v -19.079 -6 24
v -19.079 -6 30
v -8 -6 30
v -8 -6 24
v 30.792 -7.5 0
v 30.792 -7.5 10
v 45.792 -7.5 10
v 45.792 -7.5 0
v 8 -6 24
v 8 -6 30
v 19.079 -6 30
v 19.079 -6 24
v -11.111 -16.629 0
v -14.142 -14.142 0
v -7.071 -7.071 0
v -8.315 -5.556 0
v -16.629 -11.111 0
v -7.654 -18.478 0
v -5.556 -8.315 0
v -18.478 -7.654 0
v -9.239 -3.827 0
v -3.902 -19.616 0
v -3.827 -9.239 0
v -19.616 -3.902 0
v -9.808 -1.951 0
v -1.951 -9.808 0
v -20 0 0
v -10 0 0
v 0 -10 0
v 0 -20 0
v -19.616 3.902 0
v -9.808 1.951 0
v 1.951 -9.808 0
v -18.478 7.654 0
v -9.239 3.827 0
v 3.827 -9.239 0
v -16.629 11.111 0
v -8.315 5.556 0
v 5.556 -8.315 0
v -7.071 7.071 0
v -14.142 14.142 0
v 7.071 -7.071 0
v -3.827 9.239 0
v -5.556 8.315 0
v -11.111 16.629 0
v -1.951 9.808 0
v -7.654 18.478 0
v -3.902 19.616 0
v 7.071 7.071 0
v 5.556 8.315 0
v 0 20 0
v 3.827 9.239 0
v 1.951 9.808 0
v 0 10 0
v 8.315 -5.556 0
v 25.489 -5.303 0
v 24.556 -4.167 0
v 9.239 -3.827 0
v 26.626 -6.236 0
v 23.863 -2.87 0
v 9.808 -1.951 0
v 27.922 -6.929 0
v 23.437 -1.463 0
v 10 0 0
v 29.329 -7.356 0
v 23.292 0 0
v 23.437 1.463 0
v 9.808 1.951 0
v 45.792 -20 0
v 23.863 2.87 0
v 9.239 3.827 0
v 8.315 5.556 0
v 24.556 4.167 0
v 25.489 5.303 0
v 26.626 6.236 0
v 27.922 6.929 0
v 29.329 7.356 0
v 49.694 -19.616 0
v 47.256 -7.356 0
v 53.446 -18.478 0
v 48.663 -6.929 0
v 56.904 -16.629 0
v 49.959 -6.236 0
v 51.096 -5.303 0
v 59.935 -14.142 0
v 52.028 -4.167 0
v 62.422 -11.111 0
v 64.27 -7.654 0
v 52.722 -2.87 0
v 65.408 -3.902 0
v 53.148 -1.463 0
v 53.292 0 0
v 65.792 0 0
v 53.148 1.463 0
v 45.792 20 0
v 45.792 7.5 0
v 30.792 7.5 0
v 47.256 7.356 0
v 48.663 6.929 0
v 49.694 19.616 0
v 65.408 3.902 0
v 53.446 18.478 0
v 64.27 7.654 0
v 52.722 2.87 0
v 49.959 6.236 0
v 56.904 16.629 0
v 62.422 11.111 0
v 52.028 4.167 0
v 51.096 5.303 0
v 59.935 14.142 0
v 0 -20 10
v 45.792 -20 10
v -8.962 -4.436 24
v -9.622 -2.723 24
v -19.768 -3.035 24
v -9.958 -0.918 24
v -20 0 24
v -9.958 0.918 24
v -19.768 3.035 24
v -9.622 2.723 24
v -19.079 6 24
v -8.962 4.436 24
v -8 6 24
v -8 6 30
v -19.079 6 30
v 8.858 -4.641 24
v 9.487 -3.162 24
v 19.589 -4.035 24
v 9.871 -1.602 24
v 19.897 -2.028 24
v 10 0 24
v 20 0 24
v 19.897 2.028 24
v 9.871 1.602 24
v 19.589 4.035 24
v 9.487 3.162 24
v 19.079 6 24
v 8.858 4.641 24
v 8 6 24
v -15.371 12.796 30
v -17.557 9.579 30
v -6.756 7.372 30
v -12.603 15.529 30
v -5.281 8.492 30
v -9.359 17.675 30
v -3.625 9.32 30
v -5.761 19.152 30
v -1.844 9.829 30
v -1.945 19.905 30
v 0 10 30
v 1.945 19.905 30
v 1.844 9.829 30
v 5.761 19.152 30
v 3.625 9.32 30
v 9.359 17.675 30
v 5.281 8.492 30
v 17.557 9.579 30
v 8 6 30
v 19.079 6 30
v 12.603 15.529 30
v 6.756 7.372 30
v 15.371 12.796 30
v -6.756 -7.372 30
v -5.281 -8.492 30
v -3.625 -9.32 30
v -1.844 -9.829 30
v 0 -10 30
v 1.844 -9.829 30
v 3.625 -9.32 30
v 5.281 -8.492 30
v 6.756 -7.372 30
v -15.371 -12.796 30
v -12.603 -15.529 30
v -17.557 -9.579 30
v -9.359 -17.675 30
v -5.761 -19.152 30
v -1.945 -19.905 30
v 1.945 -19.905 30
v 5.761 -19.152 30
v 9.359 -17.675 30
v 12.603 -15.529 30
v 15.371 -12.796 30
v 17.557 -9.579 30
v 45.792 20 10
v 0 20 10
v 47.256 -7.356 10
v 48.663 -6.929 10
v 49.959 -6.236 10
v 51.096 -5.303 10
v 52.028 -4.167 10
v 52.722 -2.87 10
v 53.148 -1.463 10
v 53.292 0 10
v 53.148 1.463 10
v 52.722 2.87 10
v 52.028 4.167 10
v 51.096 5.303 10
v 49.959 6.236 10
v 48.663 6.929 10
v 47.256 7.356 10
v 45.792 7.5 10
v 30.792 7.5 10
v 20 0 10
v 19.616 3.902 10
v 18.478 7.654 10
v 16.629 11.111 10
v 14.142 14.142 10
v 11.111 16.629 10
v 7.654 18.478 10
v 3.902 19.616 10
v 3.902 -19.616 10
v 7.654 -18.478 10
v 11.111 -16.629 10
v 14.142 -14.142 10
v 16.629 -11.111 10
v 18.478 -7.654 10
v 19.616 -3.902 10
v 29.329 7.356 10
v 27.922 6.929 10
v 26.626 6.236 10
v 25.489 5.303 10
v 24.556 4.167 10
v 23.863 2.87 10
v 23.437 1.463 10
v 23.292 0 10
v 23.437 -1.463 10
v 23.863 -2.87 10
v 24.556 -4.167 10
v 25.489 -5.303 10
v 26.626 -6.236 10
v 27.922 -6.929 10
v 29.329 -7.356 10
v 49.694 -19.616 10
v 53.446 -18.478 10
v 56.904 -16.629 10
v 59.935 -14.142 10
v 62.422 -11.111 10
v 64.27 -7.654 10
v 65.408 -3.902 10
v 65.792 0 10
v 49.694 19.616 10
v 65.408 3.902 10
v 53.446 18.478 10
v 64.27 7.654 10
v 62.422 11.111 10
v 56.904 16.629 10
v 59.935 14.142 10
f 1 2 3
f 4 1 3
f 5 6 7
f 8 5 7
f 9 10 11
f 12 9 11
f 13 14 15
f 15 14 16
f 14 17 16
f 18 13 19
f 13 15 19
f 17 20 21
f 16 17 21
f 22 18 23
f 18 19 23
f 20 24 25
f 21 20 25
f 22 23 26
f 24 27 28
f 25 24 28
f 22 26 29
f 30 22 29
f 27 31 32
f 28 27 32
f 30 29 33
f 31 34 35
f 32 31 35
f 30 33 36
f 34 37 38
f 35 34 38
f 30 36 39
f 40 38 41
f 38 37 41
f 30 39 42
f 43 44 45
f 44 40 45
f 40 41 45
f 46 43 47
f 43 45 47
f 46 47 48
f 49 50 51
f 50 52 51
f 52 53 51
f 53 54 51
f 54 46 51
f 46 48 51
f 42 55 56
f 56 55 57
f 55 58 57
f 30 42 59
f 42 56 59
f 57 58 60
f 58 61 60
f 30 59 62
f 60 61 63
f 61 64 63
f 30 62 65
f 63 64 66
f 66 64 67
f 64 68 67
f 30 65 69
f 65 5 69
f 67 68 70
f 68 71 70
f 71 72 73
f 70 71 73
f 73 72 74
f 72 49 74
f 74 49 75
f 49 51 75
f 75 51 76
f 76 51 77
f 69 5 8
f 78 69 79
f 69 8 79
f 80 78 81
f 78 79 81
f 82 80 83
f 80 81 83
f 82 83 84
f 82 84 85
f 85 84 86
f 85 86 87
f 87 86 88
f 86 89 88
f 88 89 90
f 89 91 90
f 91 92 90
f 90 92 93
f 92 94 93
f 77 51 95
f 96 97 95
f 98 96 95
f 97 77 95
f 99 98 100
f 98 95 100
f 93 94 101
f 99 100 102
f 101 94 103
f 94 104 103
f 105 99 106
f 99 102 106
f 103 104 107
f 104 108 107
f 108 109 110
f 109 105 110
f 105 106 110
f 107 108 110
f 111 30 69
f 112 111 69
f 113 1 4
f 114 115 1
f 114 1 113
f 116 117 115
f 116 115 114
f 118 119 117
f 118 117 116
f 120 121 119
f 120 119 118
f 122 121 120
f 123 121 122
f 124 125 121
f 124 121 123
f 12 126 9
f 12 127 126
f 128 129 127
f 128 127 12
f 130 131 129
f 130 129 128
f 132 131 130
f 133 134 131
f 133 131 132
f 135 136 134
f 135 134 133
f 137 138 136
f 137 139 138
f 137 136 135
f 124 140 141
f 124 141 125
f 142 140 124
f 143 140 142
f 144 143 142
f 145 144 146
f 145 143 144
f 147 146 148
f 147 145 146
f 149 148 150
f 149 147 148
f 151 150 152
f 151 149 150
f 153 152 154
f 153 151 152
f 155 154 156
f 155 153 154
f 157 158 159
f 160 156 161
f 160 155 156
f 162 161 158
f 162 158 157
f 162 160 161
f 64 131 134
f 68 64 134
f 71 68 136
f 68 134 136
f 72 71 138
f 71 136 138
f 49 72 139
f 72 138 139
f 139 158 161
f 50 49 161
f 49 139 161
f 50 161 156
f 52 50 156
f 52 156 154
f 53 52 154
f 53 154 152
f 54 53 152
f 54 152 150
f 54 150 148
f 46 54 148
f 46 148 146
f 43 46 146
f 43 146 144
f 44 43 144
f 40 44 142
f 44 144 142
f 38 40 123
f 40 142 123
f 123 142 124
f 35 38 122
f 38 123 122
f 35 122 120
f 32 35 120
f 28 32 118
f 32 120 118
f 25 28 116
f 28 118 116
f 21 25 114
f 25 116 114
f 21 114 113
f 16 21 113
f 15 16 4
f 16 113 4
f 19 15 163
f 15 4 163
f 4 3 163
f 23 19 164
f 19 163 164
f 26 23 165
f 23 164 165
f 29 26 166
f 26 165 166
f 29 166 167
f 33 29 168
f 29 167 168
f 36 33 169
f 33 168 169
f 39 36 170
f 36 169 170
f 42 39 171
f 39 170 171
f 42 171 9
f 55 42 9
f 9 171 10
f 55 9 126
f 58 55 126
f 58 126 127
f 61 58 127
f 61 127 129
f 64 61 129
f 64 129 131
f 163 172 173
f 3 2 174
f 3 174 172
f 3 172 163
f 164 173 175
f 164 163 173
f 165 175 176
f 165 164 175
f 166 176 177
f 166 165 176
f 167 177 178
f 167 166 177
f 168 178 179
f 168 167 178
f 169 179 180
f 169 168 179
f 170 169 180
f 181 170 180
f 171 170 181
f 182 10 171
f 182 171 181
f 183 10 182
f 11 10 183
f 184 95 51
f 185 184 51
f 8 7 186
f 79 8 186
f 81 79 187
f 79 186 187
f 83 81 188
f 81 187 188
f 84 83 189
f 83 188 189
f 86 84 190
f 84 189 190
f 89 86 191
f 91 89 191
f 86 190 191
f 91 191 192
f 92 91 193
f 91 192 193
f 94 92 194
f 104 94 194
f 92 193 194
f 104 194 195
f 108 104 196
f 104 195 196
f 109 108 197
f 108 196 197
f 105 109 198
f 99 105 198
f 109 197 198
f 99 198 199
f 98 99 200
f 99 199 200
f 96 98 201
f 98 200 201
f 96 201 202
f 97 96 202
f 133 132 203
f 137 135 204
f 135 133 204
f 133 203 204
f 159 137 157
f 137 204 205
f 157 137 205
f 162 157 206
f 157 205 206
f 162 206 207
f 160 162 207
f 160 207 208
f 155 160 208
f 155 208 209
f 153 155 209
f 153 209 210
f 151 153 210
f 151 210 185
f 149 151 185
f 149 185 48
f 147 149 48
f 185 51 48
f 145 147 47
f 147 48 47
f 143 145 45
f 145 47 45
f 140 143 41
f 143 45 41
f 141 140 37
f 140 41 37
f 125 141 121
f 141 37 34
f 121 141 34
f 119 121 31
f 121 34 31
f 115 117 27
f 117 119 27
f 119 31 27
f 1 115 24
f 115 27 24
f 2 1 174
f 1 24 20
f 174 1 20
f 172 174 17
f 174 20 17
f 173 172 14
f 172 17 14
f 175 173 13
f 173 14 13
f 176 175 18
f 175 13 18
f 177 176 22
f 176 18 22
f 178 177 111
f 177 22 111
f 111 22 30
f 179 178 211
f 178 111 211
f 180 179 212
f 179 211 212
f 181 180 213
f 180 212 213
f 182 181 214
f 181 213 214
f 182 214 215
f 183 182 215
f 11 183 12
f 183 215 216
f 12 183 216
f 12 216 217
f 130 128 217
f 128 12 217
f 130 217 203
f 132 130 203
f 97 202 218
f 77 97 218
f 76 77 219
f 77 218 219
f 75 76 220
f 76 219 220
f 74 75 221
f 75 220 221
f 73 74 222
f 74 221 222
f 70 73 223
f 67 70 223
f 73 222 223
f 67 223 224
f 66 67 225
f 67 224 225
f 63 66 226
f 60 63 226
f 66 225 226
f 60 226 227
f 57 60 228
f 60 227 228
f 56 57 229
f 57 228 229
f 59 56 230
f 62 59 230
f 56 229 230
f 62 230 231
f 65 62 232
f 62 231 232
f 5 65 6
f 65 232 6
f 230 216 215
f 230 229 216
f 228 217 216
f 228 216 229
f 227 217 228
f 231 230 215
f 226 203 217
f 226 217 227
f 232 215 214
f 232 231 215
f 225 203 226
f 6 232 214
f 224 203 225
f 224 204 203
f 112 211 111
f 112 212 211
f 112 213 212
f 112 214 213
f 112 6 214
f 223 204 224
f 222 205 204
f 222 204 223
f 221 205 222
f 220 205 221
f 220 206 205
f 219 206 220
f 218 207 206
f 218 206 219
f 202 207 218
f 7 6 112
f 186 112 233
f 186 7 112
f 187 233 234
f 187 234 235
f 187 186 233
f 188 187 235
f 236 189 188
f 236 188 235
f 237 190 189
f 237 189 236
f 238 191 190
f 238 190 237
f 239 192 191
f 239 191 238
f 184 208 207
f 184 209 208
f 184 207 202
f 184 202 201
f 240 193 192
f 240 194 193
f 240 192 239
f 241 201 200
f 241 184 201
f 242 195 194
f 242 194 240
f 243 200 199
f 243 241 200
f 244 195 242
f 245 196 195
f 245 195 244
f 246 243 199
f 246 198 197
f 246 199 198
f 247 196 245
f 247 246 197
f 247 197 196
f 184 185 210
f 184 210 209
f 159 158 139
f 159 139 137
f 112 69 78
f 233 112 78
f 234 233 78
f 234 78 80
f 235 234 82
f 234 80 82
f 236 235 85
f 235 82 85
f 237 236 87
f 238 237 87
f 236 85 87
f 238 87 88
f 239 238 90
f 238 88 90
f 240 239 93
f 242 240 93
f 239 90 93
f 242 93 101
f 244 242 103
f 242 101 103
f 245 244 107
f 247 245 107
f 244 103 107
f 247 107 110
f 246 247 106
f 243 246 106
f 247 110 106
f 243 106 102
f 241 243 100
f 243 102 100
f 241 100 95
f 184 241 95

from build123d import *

# Parameters (mm, degrees)
F1_DEPTH = 10
F2_R     = 20
F3_DEPTH = 20
F4_R     = 10
F5_DEPTH = 58.8
F6_W     = 50
F6_H     = 12
F7_DEPTH = 6
F9_DEPTH = 10


with BuildPart() as f1:
    # F0 (on Top) → F1 (new body)
    with BuildSketch(Plane.XY):
        with BuildLine():
            Line((45.792472, 20), (0, 20))
            ThreePointArc((0, 20), (-20, 0), (0, -20))
            Line((0, -20), (45.792472, -20))
            ThreePointArc((45.792472, -20), (65.792472, 0), (45.792472, 20))
        make_face()
    extrude(amount=F1_DEPTH)

    # F2 (on face) → F3 (join)
    with BuildSketch(Plane.XY.offset(10)):
        Circle(F2_R)
    extrude(amount=F3_DEPTH)

    # F4 (on face) → F5 (cut)
    with BuildSketch(Plane.XY.offset(30)):
        Circle(F4_R)
    extrude(amount=-F5_DEPTH, mode=Mode.SUBTRACT)

    # F6 (on face) → F7 (cut)
    with BuildSketch(Plane.XY.offset(30)):
        Rectangle(F6_W, F6_H)
    extrude(amount=-F7_DEPTH, mode=Mode.SUBTRACT)

    # F8 (on face) → F9 (cut)
    with BuildSketch(Plane.XY.offset(10)):
        with BuildLine():
            Line((45.792472, 7.5), (30.792472, 7.5))
            ThreePointArc((30.792472, 7.5), (23.292472, 0), (30.792472, -7.5))
            Line((30.792472, -7.5), (45.792472, -7.5))
            ThreePointArc((45.792472, -7.5), (53.292472, 0), (45.792472, 7.5))
        make_face()
    extrude(amount=-F9_DEPTH, mode=Mode.SUBTRACT)


solid = f1.part
